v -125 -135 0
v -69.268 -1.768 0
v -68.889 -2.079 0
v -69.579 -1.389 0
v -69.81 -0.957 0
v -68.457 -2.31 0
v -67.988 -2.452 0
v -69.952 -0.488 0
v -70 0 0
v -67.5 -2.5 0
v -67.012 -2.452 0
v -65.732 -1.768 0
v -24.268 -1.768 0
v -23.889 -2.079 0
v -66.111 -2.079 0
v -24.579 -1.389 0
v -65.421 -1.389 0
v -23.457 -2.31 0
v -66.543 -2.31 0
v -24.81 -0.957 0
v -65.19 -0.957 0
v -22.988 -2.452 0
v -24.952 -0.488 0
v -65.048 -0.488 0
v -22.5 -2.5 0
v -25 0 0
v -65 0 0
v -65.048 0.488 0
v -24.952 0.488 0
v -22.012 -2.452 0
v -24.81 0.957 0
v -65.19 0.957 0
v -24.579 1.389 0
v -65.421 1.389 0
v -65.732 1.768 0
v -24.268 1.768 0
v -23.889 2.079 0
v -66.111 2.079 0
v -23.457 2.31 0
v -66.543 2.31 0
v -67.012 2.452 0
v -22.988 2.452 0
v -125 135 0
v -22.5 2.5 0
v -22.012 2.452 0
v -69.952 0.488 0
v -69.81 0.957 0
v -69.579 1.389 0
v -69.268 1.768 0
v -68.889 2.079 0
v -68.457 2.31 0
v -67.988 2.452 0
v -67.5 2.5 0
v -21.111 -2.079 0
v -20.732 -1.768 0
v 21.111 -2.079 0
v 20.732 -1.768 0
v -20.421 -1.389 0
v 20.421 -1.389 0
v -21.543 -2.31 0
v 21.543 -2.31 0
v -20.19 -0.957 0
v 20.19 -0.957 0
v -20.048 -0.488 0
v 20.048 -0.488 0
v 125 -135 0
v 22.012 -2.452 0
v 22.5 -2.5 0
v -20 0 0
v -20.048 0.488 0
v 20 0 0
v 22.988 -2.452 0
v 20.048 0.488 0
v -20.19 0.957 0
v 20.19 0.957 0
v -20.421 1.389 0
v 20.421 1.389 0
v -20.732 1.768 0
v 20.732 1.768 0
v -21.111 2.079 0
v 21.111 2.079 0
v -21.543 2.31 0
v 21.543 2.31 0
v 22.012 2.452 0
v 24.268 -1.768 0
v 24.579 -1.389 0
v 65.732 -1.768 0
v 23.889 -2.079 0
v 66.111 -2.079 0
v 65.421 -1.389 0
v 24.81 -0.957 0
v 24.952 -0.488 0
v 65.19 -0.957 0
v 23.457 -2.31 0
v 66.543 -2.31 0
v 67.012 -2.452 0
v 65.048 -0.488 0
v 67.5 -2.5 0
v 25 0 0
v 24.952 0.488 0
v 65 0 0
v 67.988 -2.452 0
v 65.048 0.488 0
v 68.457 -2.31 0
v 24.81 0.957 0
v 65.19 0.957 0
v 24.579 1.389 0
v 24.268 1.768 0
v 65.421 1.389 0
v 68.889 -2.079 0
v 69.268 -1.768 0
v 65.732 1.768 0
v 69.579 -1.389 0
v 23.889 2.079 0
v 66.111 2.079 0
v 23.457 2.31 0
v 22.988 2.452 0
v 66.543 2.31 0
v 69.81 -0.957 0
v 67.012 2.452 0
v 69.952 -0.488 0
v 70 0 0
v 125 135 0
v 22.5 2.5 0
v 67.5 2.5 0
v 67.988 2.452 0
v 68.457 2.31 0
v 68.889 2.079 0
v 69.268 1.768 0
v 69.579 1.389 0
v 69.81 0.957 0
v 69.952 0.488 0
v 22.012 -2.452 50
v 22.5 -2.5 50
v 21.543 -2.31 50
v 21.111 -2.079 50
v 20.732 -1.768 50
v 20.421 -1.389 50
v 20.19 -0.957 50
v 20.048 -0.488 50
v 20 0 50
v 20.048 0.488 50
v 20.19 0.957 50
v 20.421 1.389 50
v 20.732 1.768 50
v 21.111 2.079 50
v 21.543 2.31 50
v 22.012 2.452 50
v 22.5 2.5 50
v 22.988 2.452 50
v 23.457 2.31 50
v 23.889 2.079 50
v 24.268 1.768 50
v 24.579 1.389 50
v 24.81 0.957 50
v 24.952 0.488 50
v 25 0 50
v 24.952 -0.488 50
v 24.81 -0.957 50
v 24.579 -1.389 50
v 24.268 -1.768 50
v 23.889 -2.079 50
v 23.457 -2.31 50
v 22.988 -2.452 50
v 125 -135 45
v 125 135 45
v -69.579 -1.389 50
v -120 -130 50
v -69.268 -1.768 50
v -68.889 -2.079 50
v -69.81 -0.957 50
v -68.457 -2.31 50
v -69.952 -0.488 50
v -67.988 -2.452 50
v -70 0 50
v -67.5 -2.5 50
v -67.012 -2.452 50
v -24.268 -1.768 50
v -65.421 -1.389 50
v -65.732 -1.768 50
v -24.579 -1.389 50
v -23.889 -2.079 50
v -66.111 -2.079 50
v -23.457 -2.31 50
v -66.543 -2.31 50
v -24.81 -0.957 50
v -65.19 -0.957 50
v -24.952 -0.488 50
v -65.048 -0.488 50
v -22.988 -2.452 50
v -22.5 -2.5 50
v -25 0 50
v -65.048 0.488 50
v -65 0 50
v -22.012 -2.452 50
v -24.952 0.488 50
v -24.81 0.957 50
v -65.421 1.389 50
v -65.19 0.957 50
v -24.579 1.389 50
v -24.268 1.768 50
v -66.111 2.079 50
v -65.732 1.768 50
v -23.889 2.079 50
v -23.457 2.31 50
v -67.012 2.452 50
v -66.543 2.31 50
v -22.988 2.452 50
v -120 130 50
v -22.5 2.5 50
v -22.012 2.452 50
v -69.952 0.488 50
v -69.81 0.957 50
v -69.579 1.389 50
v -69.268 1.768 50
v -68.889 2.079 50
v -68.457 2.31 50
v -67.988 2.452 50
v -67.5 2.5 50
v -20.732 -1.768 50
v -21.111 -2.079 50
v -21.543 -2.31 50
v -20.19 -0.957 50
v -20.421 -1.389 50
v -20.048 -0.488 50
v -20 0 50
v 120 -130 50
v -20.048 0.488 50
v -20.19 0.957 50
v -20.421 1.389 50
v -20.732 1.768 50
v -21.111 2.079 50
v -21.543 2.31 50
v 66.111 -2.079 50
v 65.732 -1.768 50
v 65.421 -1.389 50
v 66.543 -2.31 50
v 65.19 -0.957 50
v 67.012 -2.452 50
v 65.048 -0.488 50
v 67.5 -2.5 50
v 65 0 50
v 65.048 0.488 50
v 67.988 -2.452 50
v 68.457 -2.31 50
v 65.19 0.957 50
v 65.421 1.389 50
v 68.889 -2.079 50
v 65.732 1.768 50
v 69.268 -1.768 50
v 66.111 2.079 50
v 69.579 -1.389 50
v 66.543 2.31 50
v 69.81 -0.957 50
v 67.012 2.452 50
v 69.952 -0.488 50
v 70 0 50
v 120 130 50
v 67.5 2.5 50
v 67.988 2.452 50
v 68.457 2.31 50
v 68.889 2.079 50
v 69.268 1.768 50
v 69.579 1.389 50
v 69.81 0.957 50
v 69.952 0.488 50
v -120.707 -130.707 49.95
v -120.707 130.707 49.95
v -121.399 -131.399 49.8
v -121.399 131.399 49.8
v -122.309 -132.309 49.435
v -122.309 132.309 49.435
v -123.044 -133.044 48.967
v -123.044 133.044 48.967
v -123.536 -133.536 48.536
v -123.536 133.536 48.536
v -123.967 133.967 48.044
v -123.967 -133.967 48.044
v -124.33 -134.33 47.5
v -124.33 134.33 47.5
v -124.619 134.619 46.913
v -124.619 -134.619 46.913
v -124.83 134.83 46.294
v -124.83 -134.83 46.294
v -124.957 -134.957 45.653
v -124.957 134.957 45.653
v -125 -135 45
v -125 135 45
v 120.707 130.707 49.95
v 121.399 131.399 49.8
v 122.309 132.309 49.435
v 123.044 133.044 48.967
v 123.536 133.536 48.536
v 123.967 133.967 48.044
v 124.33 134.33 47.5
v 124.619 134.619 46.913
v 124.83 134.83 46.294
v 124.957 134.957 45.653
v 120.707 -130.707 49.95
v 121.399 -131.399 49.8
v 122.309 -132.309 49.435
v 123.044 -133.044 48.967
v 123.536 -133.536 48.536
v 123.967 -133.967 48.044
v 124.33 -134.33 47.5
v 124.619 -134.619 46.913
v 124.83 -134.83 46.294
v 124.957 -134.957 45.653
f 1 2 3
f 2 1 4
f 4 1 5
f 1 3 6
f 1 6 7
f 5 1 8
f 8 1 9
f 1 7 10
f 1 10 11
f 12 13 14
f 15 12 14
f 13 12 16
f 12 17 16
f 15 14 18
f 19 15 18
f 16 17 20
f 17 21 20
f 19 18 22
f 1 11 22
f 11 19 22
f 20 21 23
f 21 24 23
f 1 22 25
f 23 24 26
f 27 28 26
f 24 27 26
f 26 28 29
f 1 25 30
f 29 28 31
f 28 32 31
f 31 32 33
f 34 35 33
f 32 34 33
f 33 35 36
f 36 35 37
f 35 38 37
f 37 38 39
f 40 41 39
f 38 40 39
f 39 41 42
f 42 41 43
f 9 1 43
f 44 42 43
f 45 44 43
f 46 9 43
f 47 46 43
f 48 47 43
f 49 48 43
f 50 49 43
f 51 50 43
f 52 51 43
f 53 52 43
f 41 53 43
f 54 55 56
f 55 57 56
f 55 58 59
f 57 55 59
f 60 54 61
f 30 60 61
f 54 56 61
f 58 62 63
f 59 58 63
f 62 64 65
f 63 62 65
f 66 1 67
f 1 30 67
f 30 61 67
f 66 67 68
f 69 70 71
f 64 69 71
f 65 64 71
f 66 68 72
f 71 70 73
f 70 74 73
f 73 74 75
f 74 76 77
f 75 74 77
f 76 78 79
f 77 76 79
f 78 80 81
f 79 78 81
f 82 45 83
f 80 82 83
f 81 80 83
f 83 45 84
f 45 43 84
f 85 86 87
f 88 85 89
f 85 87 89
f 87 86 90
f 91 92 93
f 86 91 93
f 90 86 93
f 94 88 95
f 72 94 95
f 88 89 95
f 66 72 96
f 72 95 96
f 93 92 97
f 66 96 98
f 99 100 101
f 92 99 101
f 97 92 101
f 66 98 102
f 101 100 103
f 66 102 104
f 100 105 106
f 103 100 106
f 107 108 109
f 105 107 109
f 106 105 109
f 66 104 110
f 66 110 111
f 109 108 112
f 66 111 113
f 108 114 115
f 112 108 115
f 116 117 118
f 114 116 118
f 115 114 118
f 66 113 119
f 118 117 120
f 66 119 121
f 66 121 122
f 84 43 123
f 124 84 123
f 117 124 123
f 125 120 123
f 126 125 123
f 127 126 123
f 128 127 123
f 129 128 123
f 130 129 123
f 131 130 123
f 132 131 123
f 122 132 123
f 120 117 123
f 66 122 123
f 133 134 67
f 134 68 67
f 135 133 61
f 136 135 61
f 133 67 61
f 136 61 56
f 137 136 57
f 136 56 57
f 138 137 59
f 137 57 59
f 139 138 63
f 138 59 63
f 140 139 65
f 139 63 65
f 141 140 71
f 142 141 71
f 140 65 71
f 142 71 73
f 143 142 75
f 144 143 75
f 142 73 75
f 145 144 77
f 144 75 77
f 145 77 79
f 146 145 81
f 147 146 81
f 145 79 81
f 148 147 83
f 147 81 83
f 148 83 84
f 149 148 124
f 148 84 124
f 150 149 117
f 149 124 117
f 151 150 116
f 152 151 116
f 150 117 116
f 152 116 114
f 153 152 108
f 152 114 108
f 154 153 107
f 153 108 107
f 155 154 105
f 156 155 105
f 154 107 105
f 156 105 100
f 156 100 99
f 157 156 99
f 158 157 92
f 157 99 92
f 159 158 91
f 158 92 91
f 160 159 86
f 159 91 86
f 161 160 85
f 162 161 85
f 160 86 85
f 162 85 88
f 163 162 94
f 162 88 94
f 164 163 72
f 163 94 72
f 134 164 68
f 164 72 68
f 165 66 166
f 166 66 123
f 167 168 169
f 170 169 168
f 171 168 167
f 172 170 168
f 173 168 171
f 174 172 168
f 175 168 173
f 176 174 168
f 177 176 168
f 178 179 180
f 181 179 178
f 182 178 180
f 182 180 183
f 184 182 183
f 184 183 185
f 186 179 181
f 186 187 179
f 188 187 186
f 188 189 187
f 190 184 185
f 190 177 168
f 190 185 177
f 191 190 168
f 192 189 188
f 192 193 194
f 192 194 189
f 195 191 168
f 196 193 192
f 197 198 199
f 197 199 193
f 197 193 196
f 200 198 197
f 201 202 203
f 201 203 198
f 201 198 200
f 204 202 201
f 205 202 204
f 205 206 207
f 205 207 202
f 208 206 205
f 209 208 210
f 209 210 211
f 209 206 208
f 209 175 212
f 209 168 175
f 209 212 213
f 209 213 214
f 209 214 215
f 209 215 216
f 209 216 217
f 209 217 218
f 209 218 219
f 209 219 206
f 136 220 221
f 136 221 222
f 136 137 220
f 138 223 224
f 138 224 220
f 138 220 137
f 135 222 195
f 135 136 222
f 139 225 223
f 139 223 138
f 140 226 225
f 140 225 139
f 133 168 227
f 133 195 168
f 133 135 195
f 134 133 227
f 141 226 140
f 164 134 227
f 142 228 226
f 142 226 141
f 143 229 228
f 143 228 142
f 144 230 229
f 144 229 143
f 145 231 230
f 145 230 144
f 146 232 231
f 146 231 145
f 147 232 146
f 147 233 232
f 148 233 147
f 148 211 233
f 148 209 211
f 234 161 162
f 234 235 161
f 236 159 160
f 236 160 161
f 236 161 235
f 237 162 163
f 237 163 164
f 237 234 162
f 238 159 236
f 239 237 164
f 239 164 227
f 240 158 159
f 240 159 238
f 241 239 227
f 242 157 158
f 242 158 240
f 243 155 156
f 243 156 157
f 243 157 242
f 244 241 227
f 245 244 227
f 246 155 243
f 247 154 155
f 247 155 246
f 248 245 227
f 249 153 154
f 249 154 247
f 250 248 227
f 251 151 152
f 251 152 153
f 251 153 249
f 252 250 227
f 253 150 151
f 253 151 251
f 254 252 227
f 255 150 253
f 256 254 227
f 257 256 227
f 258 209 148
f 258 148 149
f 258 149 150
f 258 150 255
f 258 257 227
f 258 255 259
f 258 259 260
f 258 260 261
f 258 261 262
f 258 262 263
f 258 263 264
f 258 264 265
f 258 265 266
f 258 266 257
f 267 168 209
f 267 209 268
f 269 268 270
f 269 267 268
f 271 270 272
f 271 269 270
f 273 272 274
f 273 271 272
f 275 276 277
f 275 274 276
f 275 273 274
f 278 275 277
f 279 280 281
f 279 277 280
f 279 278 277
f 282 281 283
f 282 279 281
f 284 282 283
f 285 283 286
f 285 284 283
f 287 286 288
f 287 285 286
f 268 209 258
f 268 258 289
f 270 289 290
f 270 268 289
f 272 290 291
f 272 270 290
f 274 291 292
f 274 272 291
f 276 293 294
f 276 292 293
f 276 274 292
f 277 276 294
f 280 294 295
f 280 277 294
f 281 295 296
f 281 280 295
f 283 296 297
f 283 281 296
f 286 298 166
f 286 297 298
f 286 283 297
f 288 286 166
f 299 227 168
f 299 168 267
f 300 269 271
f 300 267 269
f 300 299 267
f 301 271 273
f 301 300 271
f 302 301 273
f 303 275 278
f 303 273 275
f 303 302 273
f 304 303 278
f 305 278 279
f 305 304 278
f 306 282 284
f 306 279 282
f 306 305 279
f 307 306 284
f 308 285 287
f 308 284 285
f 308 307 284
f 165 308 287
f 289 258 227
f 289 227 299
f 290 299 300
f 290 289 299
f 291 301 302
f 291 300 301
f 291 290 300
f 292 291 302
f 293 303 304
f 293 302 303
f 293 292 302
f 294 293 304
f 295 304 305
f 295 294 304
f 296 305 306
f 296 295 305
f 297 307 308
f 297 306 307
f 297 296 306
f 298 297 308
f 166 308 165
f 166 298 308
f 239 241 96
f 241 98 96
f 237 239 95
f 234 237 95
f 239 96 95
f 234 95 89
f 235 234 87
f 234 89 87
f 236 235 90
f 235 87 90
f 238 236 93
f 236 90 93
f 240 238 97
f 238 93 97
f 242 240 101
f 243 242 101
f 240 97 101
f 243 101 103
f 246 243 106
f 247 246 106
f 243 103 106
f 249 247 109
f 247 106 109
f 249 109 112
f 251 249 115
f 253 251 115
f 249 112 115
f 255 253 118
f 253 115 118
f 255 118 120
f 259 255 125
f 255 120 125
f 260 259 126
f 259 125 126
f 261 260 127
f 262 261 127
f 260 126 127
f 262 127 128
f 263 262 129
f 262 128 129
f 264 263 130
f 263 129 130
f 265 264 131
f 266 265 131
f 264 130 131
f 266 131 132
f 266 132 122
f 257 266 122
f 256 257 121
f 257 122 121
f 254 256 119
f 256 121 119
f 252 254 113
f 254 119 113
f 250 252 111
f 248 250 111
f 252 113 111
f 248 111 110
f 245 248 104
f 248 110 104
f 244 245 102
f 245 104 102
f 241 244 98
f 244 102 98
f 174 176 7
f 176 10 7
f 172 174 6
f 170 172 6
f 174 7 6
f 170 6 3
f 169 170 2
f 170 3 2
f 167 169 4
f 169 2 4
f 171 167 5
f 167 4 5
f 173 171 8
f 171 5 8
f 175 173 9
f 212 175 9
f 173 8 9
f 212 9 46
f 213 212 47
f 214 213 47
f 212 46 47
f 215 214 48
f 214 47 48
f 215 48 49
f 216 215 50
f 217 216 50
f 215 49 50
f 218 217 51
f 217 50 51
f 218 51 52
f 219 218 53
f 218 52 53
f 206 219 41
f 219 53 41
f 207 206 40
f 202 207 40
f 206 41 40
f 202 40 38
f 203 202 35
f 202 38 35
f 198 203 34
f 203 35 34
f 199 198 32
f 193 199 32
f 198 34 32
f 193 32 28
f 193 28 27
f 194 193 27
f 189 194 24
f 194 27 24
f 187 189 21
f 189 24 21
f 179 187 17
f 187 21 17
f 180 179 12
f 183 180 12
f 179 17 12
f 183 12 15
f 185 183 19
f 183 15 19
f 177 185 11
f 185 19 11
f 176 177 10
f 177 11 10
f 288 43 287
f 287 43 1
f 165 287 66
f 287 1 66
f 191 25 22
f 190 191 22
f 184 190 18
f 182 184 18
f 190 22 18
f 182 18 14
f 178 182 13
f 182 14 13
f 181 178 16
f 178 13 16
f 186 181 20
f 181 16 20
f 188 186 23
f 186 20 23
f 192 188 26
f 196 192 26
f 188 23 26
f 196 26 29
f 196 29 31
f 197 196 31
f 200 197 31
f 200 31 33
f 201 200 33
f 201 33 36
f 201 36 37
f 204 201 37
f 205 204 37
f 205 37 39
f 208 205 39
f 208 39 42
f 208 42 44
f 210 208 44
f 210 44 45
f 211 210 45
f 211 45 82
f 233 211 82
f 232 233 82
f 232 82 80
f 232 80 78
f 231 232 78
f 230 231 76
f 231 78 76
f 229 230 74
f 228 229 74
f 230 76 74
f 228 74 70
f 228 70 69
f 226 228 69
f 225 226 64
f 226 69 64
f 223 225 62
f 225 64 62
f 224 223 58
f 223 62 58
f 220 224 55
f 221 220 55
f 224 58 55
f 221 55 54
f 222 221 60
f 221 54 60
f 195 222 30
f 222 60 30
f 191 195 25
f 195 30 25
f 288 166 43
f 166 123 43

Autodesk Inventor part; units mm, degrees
ref_plane "YZ Plane" through (0, 0, 0) normal (1, 0, 0) x (0, 1, 0)
ref_plane "XZ Plane" through (0, 0, 0) normal (0, 1, 0) x (-1, 0, 0)
ref_plane "XY Plane" through (0, 0, 0) normal (0, 0, 1) x (1, 0, 0)
sketch "Sketch1" plane through (0, 0, 0) normal (0, 0, 1) x (1, 0, 0)
  line L0 (-125, -135) -> (125, -135)
  line L1 (125, -135) -> (125, 135)
  line L2 (125, 135) -> (-125, 135)
  line L3 (-125, 135) -> (-125, -135)
  line L4 (-125, -135) -> (125, 135) construction
  line L5 (125, -135) -> (-125, 135) construction
  point P0 (0, 0)
  dimension "d0" = 270
  dimension "d1" = 250
extrude "Extrusion1" add sketch "Sketch1" along normal blind 50
fillet "Fillet1" radius 5 4 edges at (0, 135, 50) (125, 0, 50) (0, -135, 50) (-125, 0, 50)
sketch "Sketch2" plane through (0, 0, 50) normal (0, 0, 1) x (1, 0, 0)
  line L0 (125, 135) -> (-125, 135) projected
  line L1 (-125, 135) -> (-125, -135) projected
  point P0 (0, 0)
  point P1 (-67.5, 0)
  point P2 (-22.5, 0)
  point P3 (22.5, 0)
  point P4 (67.5, 0)
  point P5 (-125, 0)
  dimension "d5" = 135
  dimension "d6" = 45
  dimension "d7" = 45
  dimension "d8" = 45
  dimension "d10" = 67.5
hole "Hole1" at (-67.5, 0, 50) at (-22.5, 0, 50) at (22.5, 0, 50) at (67.5, 0, 50) direction (0, 0, -1) diameter 5 depth 50
equation "\"d7\" = d6"
equation "\"d8\" = d6"
properties part number "Block" material "Wood (Cherry)"
